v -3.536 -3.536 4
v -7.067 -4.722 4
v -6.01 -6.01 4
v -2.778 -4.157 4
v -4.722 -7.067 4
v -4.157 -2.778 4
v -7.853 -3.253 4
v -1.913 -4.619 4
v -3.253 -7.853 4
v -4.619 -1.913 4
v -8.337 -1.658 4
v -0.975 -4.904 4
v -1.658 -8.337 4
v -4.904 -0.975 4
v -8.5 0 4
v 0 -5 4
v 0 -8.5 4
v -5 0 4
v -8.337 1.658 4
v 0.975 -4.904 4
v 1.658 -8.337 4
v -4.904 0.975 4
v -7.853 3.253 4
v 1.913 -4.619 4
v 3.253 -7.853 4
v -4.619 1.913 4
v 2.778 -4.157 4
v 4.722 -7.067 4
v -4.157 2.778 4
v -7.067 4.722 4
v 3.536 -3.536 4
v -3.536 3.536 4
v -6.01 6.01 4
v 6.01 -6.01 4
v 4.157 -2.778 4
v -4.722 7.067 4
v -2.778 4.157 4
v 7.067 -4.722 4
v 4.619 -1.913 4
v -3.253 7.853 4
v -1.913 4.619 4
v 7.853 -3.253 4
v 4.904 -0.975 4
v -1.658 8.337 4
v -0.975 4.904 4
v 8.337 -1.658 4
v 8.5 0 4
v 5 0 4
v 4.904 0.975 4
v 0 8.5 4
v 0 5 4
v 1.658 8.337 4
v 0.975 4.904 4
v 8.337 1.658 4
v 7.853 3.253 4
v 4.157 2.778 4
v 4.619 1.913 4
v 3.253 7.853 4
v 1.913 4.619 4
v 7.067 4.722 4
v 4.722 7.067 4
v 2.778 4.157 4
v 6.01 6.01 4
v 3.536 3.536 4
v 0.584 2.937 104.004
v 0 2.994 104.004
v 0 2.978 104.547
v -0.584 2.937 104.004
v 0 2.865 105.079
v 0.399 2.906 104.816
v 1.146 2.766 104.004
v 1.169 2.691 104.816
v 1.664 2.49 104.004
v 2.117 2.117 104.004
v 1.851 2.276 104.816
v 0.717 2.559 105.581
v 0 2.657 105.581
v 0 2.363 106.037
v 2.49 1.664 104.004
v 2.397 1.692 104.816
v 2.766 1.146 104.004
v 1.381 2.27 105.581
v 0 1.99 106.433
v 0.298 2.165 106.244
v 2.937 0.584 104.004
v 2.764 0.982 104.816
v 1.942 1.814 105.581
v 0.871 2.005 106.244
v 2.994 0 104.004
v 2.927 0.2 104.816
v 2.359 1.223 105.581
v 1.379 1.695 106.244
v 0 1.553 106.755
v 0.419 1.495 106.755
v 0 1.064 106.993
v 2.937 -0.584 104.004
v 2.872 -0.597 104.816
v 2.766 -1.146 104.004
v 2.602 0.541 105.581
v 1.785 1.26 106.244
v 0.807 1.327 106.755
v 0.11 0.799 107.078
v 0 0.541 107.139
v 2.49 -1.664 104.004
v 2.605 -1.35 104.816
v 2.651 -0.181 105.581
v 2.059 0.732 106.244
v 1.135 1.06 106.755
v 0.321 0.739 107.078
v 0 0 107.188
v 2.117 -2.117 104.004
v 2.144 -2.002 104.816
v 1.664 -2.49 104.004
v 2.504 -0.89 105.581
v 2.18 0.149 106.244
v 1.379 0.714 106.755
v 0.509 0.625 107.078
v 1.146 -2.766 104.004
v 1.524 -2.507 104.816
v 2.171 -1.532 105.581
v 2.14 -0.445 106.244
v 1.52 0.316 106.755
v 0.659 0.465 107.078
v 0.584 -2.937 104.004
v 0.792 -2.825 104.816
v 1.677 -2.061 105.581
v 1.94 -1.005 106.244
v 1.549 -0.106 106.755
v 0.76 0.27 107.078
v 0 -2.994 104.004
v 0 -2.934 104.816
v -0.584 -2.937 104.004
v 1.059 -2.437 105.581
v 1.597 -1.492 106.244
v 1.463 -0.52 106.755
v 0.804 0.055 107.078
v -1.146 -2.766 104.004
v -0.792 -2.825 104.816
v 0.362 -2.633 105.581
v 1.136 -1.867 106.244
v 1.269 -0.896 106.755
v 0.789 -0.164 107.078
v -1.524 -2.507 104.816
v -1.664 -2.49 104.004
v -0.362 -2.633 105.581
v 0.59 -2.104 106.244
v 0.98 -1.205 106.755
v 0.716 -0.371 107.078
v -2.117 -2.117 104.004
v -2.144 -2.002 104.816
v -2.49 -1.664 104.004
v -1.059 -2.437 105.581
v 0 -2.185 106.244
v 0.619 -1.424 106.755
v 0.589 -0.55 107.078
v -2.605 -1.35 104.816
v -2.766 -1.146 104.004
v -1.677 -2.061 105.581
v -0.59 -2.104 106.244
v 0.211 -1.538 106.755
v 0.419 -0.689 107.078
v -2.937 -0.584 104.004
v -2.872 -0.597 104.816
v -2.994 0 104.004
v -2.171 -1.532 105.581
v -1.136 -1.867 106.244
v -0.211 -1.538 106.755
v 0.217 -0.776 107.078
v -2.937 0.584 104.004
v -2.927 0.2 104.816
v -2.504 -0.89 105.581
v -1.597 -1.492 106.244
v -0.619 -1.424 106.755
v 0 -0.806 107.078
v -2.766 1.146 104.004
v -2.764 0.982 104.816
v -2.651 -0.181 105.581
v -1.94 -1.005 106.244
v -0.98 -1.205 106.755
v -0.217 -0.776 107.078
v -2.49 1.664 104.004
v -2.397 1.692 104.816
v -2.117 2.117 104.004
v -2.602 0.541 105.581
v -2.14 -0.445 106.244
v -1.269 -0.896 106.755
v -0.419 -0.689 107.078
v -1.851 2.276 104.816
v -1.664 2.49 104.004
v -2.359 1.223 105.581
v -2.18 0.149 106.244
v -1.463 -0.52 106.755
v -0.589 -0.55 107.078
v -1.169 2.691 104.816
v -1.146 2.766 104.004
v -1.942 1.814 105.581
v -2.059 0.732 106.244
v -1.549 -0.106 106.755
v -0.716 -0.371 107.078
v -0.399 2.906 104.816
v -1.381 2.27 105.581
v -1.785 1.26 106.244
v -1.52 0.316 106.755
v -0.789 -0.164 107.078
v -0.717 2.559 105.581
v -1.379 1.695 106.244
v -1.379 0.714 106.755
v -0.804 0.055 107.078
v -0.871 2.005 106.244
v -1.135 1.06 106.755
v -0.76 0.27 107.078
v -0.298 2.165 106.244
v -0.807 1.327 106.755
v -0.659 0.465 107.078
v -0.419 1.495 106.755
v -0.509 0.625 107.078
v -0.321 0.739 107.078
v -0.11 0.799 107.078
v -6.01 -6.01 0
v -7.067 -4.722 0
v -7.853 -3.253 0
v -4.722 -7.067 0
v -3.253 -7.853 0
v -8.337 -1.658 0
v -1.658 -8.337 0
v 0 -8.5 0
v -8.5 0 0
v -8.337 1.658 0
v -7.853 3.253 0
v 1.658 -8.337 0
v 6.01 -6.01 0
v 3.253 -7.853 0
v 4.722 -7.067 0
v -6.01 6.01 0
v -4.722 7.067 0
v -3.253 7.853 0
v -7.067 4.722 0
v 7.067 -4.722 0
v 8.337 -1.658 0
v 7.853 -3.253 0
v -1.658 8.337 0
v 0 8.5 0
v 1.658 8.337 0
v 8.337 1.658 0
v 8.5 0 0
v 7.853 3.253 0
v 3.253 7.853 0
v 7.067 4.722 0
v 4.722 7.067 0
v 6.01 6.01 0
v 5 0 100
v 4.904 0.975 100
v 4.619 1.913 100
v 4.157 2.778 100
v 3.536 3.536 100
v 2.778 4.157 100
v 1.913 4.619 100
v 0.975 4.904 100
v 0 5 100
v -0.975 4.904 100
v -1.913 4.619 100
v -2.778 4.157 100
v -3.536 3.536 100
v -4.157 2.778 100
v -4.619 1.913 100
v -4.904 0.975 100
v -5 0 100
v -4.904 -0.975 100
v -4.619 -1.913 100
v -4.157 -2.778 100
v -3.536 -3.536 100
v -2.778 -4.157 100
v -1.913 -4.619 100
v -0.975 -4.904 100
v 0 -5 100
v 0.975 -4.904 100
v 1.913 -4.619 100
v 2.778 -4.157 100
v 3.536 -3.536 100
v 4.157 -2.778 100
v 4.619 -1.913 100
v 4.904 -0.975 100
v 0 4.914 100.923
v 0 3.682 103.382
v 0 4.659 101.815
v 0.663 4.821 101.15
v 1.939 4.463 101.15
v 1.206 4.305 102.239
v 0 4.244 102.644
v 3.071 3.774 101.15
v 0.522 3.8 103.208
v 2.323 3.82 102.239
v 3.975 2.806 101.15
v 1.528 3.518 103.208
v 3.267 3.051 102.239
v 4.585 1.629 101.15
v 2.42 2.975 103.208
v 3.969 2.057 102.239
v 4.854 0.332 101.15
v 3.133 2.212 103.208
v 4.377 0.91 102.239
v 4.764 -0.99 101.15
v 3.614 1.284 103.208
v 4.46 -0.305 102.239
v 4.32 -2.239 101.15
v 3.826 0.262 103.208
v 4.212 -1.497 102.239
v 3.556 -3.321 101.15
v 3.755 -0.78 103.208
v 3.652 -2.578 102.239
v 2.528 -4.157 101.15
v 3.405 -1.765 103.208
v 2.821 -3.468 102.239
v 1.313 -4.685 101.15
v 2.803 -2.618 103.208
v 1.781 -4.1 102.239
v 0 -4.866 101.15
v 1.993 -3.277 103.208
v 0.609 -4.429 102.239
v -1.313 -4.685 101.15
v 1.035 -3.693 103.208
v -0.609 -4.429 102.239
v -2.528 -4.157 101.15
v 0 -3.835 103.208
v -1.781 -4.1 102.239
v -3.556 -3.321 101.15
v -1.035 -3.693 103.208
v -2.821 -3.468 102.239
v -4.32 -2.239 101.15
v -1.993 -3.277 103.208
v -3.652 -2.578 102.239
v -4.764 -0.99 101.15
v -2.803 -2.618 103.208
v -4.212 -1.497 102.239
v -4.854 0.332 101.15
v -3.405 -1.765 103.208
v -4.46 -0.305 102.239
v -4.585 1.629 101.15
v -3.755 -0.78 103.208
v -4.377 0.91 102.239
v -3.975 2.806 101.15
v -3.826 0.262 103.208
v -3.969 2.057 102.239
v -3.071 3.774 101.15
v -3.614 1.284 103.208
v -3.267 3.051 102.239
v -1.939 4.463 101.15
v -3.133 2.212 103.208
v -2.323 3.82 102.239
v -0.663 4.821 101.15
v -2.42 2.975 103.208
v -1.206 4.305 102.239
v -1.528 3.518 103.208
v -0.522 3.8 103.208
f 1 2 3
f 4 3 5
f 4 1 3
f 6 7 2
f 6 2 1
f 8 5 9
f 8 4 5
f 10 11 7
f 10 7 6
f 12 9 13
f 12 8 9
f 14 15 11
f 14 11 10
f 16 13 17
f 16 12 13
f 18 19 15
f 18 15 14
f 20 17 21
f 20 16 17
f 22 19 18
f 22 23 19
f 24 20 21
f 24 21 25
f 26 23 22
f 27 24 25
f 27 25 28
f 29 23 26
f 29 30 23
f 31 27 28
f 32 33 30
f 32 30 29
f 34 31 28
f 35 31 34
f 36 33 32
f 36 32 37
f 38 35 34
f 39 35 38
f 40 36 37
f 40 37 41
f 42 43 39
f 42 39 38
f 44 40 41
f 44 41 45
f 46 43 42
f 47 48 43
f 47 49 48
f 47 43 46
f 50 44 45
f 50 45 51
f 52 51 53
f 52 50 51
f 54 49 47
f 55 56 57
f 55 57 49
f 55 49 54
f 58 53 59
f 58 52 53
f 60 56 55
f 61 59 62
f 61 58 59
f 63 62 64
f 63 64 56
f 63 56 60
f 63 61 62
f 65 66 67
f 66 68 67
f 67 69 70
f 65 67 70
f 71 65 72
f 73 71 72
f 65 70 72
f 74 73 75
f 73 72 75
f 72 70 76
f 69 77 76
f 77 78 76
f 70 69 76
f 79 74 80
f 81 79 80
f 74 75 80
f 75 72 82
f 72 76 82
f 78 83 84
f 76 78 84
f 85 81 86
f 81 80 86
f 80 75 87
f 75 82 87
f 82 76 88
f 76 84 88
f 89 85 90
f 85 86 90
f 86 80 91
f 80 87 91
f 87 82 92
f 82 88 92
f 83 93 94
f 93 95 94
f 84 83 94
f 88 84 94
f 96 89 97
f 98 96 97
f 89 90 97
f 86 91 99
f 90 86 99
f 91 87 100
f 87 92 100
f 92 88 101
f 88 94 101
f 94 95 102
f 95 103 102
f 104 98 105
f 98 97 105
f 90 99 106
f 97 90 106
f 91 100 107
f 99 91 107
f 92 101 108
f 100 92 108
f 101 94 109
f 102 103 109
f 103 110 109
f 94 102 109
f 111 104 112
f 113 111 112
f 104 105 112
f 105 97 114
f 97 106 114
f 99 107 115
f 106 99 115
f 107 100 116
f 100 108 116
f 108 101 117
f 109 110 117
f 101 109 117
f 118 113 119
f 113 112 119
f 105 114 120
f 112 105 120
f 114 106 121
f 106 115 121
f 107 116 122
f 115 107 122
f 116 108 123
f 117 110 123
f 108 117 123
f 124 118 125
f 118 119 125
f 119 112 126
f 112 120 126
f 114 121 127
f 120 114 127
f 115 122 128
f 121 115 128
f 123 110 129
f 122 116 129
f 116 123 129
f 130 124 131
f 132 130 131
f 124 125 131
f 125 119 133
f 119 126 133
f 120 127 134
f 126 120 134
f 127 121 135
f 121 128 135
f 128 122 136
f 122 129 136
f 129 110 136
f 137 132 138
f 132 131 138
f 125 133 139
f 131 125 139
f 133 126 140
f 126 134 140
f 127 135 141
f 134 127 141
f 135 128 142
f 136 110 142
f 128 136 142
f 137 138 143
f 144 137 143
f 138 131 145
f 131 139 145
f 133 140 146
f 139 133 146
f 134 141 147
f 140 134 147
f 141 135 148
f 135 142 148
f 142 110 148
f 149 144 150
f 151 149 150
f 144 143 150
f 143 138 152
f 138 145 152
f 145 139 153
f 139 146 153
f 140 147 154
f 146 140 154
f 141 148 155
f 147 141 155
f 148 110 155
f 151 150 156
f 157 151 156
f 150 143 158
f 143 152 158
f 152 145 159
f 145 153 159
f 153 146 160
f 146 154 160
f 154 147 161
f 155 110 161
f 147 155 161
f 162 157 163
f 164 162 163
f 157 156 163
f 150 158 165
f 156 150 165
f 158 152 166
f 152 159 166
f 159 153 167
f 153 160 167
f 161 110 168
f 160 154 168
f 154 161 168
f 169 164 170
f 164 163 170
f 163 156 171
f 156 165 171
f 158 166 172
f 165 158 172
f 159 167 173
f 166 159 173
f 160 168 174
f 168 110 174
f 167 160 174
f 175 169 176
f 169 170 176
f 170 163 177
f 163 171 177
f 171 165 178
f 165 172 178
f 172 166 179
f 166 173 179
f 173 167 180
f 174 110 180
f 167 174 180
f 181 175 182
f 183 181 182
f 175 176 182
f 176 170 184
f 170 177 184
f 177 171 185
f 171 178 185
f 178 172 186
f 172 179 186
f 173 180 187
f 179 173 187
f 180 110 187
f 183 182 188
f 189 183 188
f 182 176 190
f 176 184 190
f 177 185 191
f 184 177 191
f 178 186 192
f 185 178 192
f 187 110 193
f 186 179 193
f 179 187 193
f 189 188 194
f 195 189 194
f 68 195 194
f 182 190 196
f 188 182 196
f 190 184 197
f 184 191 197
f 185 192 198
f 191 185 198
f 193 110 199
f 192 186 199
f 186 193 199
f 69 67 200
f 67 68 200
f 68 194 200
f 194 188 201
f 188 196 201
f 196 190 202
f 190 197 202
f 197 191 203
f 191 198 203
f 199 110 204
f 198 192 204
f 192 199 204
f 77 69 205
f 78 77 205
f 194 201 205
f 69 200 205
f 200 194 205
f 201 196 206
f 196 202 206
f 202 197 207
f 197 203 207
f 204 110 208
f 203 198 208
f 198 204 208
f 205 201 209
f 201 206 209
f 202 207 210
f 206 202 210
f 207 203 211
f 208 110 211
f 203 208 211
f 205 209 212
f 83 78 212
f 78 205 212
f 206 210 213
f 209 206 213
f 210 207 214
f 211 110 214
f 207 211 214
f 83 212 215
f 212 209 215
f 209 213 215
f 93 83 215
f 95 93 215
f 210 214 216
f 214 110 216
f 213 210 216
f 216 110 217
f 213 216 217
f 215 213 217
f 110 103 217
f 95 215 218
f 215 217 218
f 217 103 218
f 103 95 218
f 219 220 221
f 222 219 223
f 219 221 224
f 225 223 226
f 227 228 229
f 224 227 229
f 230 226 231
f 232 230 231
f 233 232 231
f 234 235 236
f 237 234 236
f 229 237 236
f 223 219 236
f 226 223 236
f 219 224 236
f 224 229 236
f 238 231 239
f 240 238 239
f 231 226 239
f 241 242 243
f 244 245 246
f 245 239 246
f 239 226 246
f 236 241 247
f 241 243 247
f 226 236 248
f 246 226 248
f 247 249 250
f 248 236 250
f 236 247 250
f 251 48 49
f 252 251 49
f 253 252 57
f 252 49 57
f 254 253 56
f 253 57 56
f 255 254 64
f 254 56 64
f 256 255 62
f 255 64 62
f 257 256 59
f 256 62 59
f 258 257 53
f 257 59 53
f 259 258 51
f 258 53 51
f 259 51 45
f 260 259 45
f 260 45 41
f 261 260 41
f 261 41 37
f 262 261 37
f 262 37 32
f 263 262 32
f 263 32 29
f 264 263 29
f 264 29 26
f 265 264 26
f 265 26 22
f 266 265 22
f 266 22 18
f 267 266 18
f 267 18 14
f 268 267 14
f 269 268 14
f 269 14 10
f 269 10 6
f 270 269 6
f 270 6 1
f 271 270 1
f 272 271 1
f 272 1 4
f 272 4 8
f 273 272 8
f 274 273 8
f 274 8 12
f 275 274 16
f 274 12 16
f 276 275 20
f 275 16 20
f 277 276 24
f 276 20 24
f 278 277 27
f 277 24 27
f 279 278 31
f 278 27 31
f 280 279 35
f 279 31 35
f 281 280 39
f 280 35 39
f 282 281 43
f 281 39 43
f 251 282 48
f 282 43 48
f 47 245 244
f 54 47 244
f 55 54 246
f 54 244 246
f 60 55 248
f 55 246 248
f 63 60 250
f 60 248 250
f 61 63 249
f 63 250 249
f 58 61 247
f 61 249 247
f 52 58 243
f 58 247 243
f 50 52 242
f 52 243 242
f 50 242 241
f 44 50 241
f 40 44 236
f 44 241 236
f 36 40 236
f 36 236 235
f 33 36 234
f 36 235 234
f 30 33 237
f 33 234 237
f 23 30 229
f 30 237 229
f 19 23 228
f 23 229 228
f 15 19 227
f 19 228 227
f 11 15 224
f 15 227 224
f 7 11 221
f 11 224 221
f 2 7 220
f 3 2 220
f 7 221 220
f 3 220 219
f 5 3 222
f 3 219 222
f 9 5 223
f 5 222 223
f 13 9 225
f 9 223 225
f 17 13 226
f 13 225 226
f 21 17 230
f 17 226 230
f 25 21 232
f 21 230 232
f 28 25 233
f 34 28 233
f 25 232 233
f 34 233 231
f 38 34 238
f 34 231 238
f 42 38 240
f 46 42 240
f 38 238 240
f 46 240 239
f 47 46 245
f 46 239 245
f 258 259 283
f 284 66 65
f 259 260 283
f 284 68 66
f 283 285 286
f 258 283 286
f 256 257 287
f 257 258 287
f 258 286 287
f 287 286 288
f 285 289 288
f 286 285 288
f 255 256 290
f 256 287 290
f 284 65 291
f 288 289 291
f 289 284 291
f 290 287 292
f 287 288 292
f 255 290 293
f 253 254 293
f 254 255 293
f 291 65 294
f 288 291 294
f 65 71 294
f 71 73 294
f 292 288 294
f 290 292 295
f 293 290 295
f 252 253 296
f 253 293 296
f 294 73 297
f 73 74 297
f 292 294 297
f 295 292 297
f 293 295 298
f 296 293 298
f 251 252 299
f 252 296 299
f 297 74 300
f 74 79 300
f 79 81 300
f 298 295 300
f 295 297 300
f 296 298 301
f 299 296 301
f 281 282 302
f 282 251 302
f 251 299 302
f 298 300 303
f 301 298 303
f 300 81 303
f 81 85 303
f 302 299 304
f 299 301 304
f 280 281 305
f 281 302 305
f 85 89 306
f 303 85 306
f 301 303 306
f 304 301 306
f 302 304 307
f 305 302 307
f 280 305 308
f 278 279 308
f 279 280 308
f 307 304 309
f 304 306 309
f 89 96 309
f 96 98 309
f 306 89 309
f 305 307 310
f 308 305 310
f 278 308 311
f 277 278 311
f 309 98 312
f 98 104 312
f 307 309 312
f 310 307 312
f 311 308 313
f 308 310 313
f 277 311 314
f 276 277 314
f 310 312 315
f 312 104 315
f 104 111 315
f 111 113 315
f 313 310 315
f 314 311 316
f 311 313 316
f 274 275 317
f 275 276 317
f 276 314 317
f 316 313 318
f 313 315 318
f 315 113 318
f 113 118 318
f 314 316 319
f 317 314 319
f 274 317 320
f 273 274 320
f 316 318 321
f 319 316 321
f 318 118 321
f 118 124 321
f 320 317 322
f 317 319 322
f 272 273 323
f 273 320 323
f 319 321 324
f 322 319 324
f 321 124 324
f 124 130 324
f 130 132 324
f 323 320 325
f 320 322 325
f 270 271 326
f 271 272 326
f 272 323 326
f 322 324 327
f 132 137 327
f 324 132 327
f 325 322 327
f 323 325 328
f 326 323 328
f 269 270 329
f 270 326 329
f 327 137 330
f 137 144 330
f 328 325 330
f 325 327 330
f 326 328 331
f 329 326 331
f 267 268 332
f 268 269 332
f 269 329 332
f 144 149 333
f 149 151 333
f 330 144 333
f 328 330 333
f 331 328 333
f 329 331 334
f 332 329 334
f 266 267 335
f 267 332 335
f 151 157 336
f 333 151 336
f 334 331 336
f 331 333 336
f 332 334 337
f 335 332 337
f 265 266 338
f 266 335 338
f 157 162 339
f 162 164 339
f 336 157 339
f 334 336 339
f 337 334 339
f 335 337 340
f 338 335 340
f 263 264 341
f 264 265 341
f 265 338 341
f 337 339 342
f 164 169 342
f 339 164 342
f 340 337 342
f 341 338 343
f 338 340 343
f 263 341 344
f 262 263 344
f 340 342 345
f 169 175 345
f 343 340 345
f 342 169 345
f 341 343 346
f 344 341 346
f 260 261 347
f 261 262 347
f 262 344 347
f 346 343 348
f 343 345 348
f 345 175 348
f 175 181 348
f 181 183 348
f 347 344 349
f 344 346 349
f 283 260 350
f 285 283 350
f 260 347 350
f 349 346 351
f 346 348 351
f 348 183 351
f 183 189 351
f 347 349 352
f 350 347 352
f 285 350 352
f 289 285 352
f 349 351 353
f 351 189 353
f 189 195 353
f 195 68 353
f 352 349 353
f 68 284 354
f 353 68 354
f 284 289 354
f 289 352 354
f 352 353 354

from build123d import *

# Parameters (mm, degrees)
F0_R     = 8.5
F1_DEPTH = 4
F2_R     = 5
F3_DEPTH = 100


with BuildPart() as f1:
    # F0 (on Top) → F1 (new body)
    with BuildSketch(Plane.XY):
        Circle(F0_R)
    extrude(amount=F1_DEPTH)

    # F2 (on Top) → F3 (join)
    with BuildSketch(Plane.XY):
        Circle(F2_R)
    extrude(amount=F3_DEPTH)

    # F4 (on Right) → F5 (revolve)
    with BuildSketch(Plane.YZ):
        with BuildLine():
            Line((0, 104.0042367491), (0, 100))
            Line((0, 100), (5, 100))
            ThreePointArc((5, 100), (4.470554405, 102.2392282849), (2.9943426753, 104.0042367491))
            Line((2.9943426753, 104.0042367491), (0, 104.0042367491))
        make_face()
        with BuildLine():
            ThreePointArc((0, 105), (1.5777858306, 104.7445328403), (2.9943426753, 104.0042367491))
            ThreePointArc((2.9943426753, 104.0042367491), (2.1854582893, 106.243570465), (0, 107.1883887053))
            Line((0, 107.1883887053), (0, 105))
        make_face()
        with BuildLine():
            Line((0, 105), (0, 104.0042367491))
            Line((0, 104.0042367491), (2.9943426753, 104.0042367491))
            ThreePointArc((2.9943426753, 104.0042367491), (1.5777858306, 104.7445328403), (0, 105))
        make_face()
    revolve(axis=Axis((0, 0, 103.5941943526), (0, 0, -1)))


solid = f1.part
